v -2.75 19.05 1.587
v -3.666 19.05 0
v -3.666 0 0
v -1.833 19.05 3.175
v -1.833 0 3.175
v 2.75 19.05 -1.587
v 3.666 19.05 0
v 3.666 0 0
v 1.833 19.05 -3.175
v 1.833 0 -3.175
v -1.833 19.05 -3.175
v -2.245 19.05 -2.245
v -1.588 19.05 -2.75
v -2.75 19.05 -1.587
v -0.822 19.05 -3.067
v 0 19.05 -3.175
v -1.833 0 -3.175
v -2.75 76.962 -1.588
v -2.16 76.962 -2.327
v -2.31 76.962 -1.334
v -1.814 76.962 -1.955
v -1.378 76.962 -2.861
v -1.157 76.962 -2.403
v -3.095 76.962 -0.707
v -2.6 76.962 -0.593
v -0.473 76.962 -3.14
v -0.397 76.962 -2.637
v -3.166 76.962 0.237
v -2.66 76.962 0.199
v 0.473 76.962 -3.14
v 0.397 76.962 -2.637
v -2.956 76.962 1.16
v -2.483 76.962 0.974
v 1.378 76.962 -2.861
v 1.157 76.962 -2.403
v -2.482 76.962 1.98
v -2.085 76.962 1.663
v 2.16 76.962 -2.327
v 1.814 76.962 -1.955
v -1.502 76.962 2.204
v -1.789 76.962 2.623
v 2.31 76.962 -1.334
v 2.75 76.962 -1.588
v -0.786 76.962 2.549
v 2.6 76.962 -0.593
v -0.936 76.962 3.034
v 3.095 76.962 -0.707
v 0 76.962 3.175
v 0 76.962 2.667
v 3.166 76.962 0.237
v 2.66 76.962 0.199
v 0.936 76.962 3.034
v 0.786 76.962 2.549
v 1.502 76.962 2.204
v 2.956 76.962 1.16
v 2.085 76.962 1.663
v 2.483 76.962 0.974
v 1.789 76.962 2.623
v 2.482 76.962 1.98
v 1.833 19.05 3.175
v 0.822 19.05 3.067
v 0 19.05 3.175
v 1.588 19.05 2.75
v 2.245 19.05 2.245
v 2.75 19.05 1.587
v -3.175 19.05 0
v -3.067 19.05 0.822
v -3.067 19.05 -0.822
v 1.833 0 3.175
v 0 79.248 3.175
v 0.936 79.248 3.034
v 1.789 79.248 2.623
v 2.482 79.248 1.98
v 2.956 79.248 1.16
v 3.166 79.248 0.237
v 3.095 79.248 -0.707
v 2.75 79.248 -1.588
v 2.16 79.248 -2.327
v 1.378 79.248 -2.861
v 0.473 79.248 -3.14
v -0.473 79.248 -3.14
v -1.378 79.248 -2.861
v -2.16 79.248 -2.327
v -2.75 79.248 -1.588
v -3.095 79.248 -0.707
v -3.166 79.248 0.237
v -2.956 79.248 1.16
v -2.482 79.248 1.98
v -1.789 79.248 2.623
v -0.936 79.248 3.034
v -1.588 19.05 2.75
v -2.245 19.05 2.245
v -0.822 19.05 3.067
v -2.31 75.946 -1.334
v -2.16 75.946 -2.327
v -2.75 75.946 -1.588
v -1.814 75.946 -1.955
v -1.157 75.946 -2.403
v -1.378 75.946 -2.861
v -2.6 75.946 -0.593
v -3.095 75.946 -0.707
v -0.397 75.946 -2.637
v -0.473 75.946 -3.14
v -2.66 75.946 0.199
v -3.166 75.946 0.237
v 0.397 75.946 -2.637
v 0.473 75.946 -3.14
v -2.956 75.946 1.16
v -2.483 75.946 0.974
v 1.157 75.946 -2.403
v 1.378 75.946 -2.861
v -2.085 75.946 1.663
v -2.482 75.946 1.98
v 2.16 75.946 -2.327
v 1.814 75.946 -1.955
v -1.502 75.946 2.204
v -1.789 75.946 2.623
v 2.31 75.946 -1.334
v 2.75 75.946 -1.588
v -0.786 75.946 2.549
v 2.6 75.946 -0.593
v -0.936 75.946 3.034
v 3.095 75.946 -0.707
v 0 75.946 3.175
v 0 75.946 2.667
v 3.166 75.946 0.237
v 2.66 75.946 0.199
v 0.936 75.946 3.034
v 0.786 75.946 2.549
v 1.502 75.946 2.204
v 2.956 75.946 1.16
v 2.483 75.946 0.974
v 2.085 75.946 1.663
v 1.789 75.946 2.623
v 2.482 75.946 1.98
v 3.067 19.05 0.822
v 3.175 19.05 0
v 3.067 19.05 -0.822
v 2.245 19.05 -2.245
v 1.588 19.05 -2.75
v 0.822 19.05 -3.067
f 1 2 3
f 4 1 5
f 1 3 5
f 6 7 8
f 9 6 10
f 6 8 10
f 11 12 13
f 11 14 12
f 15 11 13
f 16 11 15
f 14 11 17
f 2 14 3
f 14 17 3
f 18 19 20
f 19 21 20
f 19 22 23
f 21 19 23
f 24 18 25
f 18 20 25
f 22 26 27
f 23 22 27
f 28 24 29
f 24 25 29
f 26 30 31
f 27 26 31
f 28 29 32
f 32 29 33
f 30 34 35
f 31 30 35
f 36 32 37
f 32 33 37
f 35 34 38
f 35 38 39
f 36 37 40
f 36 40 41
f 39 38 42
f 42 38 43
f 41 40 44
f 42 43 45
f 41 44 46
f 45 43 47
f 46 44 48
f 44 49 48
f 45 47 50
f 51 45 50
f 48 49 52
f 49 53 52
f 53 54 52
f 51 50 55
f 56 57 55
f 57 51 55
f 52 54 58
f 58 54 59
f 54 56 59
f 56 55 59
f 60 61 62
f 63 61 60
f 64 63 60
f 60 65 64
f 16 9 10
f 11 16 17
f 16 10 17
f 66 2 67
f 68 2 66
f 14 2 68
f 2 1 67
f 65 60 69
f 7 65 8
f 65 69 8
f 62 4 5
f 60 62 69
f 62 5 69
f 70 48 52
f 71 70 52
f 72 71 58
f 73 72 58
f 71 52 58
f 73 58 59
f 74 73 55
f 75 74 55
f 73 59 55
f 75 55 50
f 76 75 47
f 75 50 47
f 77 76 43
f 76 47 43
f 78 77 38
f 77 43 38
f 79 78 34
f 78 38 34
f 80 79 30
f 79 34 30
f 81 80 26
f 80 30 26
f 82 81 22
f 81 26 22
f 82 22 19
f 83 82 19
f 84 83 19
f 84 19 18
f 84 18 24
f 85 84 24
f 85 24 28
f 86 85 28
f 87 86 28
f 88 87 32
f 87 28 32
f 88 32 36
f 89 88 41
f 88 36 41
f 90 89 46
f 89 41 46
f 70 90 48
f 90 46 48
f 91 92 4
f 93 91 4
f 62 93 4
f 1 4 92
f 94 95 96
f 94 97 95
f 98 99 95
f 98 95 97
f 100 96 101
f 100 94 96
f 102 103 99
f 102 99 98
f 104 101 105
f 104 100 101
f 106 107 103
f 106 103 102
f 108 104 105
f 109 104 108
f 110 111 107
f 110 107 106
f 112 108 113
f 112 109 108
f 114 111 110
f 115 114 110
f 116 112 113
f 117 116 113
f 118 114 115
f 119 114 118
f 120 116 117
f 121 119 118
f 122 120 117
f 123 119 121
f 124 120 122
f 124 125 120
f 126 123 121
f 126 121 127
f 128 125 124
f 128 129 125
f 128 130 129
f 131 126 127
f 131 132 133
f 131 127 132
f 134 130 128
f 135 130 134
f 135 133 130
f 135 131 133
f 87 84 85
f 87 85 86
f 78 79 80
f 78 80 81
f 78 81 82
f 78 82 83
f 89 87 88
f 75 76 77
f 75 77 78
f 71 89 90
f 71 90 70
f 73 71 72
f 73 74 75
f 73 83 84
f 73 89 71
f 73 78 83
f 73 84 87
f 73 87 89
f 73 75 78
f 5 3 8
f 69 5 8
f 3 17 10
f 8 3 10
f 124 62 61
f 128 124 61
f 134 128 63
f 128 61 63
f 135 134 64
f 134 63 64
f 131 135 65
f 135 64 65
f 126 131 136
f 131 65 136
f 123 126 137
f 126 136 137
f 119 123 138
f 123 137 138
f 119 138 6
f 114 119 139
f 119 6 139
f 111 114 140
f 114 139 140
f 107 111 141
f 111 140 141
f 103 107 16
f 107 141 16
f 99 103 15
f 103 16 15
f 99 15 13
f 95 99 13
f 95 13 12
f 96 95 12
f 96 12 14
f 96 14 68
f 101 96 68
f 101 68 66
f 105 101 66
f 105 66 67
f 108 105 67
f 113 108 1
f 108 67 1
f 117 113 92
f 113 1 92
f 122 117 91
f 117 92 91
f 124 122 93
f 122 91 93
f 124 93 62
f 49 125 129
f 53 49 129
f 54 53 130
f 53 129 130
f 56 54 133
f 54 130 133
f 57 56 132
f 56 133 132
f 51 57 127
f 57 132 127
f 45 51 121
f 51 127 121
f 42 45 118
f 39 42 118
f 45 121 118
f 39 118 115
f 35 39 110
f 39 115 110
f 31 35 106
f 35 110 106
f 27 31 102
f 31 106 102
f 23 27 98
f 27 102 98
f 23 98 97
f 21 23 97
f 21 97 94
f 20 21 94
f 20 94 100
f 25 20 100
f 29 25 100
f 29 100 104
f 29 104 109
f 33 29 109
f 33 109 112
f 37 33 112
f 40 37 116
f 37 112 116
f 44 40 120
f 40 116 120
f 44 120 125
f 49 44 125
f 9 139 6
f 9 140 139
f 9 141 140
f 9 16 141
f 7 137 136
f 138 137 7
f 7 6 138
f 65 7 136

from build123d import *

# Parameters (mm, degrees)
BOSS_EXTRUDE1_DEPTH = 19.05
SKETCH2_R           = 3.175
BOSS_EXTRUDE2_DEPTH = 56.896
SKETCH3_R           = 2.667
BOSS_EXTRUDE3_DEPTH = 1.016
SKETCH4_R           = 3.175
BOSS_EXTRUDE4_DEPTH = 2.286


with BuildPart() as part:
    # Sketch1 → Boss-Extrude1 (new body)
    with BuildSketch(Plane(origin=(0, 0, 0), x_dir=(1, 0, 0), z_dir=(0, 1, 0))):
        Polygon((1.833087105, 3.175), (-1.833087105, 3.175), (-3.666174209, 0), (-1.833087105, -3.175), (1.833087105, -3.175), (3.666174209, 0), align=None)
    extrude(amount=BOSS_EXTRUDE1_DEPTH)

    # Sketch2 → Boss-Extrude2 (add)
    with BuildSketch(Plane(origin=(0, 19.05, 0), x_dir=(1, 0, 0), z_dir=(0, 1, 0))):
        with Locations(Location((0, 0, 0), (0, 0, 270))):
            Circle(SKETCH2_R)
    extrude(amount=BOSS_EXTRUDE2_DEPTH)

    # Sketch3 → Boss-Extrude3 (add)
    with BuildSketch(Plane(origin=(0, 75.946, 0), x_dir=(1, 0, 0), z_dir=(0, 1, 0))):
        with Locations(Location((0, 0, 0), (0, 0, 270))):
            Circle(SKETCH3_R)
    extrude(amount=BOSS_EXTRUDE3_DEPTH)

    # Sketch4 → Boss-Extrude4 (add)
    with BuildSketch(Plane(origin=(0, 76.962, 0), x_dir=(1, 0, 0), z_dir=(0, 1, 0))):
        with Locations(Location((0, 0, 0), (0, 0, 270))):
            Circle(SKETCH4_R)
    extrude(amount=BOSS_EXTRUDE4_DEPTH)


solid = part.part
